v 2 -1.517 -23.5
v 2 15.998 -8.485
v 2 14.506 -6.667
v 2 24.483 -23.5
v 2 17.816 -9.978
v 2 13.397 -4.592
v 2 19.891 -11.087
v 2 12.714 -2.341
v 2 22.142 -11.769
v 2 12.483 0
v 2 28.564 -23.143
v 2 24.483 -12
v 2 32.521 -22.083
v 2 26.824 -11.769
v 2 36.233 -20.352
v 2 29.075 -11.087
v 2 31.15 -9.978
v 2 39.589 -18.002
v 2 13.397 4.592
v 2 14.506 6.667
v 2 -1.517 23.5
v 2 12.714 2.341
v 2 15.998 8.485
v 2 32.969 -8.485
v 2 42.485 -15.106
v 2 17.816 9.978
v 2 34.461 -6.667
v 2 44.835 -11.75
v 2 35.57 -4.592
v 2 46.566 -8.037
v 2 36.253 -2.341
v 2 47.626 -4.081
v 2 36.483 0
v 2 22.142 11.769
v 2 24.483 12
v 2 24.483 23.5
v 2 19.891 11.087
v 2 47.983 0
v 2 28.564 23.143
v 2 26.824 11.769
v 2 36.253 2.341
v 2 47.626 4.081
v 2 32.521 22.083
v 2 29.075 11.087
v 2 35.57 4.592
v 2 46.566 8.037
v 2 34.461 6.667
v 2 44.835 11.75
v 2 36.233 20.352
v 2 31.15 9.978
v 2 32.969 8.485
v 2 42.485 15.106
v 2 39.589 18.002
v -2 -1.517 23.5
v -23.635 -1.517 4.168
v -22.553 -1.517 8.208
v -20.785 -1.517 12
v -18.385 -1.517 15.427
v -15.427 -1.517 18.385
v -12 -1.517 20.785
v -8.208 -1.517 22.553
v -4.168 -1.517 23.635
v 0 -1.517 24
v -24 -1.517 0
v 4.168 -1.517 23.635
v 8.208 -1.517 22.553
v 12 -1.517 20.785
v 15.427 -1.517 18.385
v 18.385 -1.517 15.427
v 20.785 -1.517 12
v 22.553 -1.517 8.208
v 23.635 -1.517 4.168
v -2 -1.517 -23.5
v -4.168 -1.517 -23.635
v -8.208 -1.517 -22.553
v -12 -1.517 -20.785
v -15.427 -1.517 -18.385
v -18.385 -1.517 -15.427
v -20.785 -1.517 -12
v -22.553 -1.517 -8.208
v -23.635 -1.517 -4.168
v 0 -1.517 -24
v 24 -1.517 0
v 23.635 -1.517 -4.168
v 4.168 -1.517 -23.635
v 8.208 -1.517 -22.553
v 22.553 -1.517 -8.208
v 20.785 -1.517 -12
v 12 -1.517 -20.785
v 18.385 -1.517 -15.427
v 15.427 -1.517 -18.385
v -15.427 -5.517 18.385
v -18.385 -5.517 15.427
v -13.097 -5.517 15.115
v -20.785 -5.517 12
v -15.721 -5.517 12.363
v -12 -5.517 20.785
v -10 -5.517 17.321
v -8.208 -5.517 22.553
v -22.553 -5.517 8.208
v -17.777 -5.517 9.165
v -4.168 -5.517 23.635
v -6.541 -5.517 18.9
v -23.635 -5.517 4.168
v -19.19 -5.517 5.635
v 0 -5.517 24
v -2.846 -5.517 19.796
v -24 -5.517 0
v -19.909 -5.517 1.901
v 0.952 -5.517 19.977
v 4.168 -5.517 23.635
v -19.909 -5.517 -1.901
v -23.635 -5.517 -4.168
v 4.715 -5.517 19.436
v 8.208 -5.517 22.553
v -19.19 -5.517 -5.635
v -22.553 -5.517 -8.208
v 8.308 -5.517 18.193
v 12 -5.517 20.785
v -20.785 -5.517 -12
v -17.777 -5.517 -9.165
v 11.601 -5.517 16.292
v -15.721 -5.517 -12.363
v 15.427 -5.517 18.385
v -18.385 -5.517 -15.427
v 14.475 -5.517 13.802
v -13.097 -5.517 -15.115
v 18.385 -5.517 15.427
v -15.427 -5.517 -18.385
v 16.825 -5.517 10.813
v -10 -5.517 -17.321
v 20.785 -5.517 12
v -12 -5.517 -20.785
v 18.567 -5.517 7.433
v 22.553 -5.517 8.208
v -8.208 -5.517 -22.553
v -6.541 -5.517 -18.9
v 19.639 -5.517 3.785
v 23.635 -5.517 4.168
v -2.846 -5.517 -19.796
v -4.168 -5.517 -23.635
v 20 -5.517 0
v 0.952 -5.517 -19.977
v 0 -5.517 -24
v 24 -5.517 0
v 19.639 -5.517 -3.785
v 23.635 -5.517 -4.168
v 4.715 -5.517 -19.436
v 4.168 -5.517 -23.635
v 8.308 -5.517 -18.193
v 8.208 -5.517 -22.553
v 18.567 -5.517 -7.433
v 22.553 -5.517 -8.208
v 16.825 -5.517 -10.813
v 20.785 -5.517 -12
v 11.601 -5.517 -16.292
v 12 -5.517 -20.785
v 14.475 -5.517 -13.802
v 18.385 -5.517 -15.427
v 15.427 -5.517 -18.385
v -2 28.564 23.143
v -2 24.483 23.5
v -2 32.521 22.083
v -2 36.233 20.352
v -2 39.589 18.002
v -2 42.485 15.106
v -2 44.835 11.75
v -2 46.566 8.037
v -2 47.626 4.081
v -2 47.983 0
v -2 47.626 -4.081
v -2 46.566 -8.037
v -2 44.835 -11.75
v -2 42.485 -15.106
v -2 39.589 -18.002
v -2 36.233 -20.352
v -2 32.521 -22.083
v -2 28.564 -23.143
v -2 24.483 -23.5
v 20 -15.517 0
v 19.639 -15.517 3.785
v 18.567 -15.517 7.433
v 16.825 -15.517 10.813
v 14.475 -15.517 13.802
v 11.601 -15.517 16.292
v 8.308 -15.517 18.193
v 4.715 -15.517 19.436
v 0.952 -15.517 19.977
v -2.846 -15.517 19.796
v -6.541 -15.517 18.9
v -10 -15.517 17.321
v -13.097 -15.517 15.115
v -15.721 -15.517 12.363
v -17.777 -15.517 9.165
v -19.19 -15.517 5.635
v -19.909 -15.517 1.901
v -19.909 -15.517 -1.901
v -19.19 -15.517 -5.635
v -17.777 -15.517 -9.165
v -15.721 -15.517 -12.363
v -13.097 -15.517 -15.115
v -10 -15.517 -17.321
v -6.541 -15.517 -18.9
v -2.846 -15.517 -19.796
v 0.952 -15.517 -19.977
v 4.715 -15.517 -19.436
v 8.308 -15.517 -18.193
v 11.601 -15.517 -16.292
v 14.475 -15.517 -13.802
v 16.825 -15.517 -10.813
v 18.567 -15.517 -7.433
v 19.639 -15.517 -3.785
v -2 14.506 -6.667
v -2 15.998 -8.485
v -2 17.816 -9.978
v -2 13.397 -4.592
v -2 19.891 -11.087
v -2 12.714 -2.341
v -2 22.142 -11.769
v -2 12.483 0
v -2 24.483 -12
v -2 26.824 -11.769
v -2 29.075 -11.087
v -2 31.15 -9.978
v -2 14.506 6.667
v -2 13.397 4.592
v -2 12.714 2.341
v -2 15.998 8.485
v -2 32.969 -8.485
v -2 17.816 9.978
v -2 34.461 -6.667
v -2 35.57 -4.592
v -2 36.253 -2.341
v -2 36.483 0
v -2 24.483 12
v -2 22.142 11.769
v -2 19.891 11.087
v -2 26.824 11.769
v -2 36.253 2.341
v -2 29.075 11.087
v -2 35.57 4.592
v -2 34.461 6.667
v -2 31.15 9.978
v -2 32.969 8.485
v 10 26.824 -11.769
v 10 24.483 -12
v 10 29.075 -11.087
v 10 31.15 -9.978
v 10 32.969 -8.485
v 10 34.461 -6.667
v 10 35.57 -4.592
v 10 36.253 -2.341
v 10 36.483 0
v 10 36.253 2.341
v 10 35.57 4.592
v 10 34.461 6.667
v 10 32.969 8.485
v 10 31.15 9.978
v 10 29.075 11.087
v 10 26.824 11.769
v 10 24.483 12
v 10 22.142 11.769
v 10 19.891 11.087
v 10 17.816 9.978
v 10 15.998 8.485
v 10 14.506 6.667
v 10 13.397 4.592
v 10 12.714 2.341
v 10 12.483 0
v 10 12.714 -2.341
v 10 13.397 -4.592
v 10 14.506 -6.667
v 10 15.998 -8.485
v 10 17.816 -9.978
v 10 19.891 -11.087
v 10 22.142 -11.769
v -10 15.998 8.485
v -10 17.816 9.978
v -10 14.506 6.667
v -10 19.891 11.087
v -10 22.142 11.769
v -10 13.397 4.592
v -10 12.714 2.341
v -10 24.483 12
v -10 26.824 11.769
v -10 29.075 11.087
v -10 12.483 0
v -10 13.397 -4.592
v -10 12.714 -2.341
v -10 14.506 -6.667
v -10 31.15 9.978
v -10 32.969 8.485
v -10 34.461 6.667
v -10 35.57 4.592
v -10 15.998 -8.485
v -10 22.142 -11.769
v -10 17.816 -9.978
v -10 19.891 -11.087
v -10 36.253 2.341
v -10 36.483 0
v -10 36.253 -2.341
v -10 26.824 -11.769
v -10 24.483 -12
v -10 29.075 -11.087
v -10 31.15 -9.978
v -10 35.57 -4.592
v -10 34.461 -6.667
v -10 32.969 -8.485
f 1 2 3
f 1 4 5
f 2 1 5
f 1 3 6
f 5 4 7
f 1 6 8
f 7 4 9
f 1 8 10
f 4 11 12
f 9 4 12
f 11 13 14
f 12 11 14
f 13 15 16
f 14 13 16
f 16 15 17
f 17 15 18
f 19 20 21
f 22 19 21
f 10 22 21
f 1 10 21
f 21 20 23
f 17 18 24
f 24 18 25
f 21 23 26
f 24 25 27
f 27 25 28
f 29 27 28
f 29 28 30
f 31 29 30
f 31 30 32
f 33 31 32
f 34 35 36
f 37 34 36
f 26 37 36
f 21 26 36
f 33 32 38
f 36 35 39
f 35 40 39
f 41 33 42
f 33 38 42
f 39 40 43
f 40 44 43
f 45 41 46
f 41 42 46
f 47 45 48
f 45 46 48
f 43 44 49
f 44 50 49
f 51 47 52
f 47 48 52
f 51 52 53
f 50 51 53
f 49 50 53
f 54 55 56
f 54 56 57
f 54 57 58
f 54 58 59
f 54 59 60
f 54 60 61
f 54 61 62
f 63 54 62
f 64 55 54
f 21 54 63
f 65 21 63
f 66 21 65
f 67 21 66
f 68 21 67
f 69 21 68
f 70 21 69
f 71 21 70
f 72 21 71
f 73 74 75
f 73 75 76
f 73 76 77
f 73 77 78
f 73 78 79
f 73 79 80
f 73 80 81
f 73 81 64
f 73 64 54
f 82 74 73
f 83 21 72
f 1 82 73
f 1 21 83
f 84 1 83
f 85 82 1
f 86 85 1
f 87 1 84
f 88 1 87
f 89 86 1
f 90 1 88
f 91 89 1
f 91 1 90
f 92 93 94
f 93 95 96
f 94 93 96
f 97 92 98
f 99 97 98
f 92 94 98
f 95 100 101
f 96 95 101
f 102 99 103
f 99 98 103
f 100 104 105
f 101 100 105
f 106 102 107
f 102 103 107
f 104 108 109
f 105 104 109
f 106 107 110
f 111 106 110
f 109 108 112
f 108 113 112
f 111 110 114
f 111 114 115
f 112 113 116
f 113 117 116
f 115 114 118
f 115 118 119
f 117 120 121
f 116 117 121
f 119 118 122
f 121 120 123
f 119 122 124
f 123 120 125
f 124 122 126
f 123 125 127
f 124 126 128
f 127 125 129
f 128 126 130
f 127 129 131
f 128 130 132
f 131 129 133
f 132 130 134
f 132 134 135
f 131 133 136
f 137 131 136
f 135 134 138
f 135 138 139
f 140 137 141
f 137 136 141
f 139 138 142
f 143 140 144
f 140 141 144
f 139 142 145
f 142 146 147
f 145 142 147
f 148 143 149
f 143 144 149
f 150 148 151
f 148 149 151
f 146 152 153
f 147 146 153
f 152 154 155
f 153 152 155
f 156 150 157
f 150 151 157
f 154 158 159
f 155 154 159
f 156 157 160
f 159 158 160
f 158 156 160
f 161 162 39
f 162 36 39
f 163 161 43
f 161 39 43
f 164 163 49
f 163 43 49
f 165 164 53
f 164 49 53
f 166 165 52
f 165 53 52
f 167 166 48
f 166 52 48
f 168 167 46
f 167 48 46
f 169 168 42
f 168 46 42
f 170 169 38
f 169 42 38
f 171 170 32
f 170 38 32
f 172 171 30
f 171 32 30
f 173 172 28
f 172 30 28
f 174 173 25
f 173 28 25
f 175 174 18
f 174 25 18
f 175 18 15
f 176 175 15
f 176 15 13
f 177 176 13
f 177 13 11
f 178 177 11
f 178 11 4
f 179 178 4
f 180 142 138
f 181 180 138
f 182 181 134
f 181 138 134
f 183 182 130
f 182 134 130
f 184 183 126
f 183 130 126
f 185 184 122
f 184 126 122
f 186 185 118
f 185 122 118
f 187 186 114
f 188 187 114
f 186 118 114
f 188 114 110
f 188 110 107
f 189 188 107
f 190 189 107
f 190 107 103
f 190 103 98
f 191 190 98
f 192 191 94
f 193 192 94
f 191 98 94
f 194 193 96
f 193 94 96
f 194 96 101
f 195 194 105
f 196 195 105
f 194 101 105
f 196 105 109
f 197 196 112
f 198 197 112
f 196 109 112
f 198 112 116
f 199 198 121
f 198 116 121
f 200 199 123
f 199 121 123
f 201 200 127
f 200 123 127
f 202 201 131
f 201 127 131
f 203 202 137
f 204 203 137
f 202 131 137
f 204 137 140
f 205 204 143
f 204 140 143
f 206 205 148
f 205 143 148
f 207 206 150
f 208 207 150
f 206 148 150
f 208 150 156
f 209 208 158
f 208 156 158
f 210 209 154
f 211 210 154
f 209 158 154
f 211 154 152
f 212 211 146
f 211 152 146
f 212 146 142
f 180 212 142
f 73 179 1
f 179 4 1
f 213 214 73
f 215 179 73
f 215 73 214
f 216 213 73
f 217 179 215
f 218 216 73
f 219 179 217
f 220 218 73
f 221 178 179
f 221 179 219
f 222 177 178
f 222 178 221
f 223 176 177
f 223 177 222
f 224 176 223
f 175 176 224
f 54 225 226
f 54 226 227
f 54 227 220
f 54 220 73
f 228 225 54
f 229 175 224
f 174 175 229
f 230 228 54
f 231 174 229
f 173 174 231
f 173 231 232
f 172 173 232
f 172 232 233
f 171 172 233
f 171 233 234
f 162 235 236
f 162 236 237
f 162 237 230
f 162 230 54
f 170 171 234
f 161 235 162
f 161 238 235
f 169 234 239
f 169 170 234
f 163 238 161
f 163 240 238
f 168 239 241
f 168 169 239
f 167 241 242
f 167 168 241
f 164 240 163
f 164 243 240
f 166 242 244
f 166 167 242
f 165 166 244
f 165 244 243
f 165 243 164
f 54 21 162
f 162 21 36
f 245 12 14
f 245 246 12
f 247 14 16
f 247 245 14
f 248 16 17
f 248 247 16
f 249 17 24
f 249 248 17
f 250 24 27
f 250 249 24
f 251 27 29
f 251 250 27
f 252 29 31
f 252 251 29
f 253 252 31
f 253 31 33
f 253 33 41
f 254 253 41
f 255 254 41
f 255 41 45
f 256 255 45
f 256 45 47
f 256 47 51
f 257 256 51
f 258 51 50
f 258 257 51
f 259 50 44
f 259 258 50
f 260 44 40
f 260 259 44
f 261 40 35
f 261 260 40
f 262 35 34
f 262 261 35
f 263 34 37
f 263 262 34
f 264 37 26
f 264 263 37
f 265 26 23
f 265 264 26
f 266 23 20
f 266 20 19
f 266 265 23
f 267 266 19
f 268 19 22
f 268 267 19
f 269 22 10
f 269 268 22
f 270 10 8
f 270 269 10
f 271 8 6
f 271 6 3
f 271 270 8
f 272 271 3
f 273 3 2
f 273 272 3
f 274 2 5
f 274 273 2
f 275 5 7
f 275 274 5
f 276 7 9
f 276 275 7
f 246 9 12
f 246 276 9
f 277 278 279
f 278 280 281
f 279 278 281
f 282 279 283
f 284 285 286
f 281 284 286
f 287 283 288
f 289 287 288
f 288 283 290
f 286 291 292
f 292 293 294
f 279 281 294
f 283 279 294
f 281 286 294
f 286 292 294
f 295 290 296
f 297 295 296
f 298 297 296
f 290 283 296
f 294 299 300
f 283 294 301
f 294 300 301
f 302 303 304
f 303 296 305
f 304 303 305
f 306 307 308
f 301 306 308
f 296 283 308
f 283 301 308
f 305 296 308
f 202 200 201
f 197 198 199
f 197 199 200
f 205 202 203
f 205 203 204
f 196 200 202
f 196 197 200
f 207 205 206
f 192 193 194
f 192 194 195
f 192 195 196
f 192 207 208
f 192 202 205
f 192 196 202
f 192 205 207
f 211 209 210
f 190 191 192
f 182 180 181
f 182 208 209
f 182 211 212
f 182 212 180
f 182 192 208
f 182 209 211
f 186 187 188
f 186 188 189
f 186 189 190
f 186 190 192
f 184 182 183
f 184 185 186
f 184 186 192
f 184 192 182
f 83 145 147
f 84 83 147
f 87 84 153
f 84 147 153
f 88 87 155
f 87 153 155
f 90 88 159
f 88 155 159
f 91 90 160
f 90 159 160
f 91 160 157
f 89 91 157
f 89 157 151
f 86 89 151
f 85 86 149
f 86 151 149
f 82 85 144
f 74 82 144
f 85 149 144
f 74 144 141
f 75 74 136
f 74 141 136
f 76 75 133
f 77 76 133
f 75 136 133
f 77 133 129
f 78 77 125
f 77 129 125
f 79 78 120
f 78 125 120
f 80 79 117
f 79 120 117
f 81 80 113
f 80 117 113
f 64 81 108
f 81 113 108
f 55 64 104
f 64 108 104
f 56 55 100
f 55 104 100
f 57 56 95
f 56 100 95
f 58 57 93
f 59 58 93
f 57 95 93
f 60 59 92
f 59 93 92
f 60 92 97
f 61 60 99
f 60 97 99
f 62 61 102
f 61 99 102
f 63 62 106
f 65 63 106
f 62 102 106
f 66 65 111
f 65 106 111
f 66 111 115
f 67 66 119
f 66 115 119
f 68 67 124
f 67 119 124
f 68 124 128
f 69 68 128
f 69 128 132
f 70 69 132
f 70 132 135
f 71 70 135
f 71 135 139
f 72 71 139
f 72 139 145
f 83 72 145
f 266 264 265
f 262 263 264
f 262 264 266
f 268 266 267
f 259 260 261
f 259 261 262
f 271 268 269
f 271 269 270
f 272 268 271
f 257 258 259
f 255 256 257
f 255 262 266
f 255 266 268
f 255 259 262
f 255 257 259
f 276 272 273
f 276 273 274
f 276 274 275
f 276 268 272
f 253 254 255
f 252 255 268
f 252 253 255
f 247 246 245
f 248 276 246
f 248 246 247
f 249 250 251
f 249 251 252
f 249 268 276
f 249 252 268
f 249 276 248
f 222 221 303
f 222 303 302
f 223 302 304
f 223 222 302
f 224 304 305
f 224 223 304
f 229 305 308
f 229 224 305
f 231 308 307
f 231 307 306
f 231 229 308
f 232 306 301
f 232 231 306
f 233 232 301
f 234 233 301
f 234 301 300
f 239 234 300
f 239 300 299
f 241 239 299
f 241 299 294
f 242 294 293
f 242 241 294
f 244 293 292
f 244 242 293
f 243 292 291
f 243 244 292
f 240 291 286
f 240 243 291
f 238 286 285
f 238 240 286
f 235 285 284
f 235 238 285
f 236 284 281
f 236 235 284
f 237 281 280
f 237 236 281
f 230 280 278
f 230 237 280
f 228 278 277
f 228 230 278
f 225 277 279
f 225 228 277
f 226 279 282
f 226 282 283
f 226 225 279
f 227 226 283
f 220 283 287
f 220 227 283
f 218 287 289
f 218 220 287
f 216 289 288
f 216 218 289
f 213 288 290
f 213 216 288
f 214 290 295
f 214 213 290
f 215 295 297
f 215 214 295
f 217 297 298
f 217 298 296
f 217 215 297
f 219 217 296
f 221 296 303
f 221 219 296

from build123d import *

# Parameters (mm, degrees)
SKETCH1_R           = 12
BOSS_EXTRUDE1_DEPTH = 2
BOSS_EXTRUDE2_DEPTH = 1
SKETCH3_R           = 10
BOSS_EXTRUDE3_DEPTH = 5
SKETCH4_R           = 6
BOSS_EXTRUDE4_DEPTH = 5
SCALE1_SCALE        = 2


with BuildPart() as part:
    # Sketch1 → Boss-Extrude1 (new body)
    with BuildSketch(Plane(origin=(0, 0, 0), x_dir=(1, 0, 0), z_dir=(0, 1, 0))):
        Circle(SKETCH1_R)
    extrude(amount=BOSS_EXTRUDE1_DEPTH)

    # Sketch2 → Boss-Extrude2 (add, symmetric)
    with BuildSketch(Plane(origin=(0, 0, 0), x_dir=(0, 0, -1), z_dir=(1, 0, 0))):
        with BuildLine():
            Line((-11.75, 2), (-11.75, 15))
            ThreePointArc((-11.75, 15), (0, 26.75), (11.75, 15))
            Line((11.75, 15), (11.75, 2))
            Line((11.75, 2), (-11.75, 2))
        make_face()
    extrude(amount=BOSS_EXTRUDE2_DEPTH, both=True)

    # Sketch3 → Boss-Extrude3 (add)
    with BuildSketch(Plane.XZ):
        Circle(SKETCH3_R)
    extrude(amount=BOSS_EXTRUDE3_DEPTH)

    # Sketch4 → Boss-Extrude4 (add, symmetric)
    with BuildSketch(Plane(origin=(0, 0, 0), x_dir=(0, 0, -1), z_dir=(1, 0, 0))):
        with Locations((0, 15)):
            Circle(SKETCH4_R)
    extrude(amount=BOSS_EXTRUDE4_DEPTH, both=True)


with BuildPart() as part_1:
    # Scale1: scaled about (0, 5.516721754, 0)
    add(part.part.scale(SCALE1_SCALE).moved(Location((0, -5.516721754, 0))))


solid = part_1.part
